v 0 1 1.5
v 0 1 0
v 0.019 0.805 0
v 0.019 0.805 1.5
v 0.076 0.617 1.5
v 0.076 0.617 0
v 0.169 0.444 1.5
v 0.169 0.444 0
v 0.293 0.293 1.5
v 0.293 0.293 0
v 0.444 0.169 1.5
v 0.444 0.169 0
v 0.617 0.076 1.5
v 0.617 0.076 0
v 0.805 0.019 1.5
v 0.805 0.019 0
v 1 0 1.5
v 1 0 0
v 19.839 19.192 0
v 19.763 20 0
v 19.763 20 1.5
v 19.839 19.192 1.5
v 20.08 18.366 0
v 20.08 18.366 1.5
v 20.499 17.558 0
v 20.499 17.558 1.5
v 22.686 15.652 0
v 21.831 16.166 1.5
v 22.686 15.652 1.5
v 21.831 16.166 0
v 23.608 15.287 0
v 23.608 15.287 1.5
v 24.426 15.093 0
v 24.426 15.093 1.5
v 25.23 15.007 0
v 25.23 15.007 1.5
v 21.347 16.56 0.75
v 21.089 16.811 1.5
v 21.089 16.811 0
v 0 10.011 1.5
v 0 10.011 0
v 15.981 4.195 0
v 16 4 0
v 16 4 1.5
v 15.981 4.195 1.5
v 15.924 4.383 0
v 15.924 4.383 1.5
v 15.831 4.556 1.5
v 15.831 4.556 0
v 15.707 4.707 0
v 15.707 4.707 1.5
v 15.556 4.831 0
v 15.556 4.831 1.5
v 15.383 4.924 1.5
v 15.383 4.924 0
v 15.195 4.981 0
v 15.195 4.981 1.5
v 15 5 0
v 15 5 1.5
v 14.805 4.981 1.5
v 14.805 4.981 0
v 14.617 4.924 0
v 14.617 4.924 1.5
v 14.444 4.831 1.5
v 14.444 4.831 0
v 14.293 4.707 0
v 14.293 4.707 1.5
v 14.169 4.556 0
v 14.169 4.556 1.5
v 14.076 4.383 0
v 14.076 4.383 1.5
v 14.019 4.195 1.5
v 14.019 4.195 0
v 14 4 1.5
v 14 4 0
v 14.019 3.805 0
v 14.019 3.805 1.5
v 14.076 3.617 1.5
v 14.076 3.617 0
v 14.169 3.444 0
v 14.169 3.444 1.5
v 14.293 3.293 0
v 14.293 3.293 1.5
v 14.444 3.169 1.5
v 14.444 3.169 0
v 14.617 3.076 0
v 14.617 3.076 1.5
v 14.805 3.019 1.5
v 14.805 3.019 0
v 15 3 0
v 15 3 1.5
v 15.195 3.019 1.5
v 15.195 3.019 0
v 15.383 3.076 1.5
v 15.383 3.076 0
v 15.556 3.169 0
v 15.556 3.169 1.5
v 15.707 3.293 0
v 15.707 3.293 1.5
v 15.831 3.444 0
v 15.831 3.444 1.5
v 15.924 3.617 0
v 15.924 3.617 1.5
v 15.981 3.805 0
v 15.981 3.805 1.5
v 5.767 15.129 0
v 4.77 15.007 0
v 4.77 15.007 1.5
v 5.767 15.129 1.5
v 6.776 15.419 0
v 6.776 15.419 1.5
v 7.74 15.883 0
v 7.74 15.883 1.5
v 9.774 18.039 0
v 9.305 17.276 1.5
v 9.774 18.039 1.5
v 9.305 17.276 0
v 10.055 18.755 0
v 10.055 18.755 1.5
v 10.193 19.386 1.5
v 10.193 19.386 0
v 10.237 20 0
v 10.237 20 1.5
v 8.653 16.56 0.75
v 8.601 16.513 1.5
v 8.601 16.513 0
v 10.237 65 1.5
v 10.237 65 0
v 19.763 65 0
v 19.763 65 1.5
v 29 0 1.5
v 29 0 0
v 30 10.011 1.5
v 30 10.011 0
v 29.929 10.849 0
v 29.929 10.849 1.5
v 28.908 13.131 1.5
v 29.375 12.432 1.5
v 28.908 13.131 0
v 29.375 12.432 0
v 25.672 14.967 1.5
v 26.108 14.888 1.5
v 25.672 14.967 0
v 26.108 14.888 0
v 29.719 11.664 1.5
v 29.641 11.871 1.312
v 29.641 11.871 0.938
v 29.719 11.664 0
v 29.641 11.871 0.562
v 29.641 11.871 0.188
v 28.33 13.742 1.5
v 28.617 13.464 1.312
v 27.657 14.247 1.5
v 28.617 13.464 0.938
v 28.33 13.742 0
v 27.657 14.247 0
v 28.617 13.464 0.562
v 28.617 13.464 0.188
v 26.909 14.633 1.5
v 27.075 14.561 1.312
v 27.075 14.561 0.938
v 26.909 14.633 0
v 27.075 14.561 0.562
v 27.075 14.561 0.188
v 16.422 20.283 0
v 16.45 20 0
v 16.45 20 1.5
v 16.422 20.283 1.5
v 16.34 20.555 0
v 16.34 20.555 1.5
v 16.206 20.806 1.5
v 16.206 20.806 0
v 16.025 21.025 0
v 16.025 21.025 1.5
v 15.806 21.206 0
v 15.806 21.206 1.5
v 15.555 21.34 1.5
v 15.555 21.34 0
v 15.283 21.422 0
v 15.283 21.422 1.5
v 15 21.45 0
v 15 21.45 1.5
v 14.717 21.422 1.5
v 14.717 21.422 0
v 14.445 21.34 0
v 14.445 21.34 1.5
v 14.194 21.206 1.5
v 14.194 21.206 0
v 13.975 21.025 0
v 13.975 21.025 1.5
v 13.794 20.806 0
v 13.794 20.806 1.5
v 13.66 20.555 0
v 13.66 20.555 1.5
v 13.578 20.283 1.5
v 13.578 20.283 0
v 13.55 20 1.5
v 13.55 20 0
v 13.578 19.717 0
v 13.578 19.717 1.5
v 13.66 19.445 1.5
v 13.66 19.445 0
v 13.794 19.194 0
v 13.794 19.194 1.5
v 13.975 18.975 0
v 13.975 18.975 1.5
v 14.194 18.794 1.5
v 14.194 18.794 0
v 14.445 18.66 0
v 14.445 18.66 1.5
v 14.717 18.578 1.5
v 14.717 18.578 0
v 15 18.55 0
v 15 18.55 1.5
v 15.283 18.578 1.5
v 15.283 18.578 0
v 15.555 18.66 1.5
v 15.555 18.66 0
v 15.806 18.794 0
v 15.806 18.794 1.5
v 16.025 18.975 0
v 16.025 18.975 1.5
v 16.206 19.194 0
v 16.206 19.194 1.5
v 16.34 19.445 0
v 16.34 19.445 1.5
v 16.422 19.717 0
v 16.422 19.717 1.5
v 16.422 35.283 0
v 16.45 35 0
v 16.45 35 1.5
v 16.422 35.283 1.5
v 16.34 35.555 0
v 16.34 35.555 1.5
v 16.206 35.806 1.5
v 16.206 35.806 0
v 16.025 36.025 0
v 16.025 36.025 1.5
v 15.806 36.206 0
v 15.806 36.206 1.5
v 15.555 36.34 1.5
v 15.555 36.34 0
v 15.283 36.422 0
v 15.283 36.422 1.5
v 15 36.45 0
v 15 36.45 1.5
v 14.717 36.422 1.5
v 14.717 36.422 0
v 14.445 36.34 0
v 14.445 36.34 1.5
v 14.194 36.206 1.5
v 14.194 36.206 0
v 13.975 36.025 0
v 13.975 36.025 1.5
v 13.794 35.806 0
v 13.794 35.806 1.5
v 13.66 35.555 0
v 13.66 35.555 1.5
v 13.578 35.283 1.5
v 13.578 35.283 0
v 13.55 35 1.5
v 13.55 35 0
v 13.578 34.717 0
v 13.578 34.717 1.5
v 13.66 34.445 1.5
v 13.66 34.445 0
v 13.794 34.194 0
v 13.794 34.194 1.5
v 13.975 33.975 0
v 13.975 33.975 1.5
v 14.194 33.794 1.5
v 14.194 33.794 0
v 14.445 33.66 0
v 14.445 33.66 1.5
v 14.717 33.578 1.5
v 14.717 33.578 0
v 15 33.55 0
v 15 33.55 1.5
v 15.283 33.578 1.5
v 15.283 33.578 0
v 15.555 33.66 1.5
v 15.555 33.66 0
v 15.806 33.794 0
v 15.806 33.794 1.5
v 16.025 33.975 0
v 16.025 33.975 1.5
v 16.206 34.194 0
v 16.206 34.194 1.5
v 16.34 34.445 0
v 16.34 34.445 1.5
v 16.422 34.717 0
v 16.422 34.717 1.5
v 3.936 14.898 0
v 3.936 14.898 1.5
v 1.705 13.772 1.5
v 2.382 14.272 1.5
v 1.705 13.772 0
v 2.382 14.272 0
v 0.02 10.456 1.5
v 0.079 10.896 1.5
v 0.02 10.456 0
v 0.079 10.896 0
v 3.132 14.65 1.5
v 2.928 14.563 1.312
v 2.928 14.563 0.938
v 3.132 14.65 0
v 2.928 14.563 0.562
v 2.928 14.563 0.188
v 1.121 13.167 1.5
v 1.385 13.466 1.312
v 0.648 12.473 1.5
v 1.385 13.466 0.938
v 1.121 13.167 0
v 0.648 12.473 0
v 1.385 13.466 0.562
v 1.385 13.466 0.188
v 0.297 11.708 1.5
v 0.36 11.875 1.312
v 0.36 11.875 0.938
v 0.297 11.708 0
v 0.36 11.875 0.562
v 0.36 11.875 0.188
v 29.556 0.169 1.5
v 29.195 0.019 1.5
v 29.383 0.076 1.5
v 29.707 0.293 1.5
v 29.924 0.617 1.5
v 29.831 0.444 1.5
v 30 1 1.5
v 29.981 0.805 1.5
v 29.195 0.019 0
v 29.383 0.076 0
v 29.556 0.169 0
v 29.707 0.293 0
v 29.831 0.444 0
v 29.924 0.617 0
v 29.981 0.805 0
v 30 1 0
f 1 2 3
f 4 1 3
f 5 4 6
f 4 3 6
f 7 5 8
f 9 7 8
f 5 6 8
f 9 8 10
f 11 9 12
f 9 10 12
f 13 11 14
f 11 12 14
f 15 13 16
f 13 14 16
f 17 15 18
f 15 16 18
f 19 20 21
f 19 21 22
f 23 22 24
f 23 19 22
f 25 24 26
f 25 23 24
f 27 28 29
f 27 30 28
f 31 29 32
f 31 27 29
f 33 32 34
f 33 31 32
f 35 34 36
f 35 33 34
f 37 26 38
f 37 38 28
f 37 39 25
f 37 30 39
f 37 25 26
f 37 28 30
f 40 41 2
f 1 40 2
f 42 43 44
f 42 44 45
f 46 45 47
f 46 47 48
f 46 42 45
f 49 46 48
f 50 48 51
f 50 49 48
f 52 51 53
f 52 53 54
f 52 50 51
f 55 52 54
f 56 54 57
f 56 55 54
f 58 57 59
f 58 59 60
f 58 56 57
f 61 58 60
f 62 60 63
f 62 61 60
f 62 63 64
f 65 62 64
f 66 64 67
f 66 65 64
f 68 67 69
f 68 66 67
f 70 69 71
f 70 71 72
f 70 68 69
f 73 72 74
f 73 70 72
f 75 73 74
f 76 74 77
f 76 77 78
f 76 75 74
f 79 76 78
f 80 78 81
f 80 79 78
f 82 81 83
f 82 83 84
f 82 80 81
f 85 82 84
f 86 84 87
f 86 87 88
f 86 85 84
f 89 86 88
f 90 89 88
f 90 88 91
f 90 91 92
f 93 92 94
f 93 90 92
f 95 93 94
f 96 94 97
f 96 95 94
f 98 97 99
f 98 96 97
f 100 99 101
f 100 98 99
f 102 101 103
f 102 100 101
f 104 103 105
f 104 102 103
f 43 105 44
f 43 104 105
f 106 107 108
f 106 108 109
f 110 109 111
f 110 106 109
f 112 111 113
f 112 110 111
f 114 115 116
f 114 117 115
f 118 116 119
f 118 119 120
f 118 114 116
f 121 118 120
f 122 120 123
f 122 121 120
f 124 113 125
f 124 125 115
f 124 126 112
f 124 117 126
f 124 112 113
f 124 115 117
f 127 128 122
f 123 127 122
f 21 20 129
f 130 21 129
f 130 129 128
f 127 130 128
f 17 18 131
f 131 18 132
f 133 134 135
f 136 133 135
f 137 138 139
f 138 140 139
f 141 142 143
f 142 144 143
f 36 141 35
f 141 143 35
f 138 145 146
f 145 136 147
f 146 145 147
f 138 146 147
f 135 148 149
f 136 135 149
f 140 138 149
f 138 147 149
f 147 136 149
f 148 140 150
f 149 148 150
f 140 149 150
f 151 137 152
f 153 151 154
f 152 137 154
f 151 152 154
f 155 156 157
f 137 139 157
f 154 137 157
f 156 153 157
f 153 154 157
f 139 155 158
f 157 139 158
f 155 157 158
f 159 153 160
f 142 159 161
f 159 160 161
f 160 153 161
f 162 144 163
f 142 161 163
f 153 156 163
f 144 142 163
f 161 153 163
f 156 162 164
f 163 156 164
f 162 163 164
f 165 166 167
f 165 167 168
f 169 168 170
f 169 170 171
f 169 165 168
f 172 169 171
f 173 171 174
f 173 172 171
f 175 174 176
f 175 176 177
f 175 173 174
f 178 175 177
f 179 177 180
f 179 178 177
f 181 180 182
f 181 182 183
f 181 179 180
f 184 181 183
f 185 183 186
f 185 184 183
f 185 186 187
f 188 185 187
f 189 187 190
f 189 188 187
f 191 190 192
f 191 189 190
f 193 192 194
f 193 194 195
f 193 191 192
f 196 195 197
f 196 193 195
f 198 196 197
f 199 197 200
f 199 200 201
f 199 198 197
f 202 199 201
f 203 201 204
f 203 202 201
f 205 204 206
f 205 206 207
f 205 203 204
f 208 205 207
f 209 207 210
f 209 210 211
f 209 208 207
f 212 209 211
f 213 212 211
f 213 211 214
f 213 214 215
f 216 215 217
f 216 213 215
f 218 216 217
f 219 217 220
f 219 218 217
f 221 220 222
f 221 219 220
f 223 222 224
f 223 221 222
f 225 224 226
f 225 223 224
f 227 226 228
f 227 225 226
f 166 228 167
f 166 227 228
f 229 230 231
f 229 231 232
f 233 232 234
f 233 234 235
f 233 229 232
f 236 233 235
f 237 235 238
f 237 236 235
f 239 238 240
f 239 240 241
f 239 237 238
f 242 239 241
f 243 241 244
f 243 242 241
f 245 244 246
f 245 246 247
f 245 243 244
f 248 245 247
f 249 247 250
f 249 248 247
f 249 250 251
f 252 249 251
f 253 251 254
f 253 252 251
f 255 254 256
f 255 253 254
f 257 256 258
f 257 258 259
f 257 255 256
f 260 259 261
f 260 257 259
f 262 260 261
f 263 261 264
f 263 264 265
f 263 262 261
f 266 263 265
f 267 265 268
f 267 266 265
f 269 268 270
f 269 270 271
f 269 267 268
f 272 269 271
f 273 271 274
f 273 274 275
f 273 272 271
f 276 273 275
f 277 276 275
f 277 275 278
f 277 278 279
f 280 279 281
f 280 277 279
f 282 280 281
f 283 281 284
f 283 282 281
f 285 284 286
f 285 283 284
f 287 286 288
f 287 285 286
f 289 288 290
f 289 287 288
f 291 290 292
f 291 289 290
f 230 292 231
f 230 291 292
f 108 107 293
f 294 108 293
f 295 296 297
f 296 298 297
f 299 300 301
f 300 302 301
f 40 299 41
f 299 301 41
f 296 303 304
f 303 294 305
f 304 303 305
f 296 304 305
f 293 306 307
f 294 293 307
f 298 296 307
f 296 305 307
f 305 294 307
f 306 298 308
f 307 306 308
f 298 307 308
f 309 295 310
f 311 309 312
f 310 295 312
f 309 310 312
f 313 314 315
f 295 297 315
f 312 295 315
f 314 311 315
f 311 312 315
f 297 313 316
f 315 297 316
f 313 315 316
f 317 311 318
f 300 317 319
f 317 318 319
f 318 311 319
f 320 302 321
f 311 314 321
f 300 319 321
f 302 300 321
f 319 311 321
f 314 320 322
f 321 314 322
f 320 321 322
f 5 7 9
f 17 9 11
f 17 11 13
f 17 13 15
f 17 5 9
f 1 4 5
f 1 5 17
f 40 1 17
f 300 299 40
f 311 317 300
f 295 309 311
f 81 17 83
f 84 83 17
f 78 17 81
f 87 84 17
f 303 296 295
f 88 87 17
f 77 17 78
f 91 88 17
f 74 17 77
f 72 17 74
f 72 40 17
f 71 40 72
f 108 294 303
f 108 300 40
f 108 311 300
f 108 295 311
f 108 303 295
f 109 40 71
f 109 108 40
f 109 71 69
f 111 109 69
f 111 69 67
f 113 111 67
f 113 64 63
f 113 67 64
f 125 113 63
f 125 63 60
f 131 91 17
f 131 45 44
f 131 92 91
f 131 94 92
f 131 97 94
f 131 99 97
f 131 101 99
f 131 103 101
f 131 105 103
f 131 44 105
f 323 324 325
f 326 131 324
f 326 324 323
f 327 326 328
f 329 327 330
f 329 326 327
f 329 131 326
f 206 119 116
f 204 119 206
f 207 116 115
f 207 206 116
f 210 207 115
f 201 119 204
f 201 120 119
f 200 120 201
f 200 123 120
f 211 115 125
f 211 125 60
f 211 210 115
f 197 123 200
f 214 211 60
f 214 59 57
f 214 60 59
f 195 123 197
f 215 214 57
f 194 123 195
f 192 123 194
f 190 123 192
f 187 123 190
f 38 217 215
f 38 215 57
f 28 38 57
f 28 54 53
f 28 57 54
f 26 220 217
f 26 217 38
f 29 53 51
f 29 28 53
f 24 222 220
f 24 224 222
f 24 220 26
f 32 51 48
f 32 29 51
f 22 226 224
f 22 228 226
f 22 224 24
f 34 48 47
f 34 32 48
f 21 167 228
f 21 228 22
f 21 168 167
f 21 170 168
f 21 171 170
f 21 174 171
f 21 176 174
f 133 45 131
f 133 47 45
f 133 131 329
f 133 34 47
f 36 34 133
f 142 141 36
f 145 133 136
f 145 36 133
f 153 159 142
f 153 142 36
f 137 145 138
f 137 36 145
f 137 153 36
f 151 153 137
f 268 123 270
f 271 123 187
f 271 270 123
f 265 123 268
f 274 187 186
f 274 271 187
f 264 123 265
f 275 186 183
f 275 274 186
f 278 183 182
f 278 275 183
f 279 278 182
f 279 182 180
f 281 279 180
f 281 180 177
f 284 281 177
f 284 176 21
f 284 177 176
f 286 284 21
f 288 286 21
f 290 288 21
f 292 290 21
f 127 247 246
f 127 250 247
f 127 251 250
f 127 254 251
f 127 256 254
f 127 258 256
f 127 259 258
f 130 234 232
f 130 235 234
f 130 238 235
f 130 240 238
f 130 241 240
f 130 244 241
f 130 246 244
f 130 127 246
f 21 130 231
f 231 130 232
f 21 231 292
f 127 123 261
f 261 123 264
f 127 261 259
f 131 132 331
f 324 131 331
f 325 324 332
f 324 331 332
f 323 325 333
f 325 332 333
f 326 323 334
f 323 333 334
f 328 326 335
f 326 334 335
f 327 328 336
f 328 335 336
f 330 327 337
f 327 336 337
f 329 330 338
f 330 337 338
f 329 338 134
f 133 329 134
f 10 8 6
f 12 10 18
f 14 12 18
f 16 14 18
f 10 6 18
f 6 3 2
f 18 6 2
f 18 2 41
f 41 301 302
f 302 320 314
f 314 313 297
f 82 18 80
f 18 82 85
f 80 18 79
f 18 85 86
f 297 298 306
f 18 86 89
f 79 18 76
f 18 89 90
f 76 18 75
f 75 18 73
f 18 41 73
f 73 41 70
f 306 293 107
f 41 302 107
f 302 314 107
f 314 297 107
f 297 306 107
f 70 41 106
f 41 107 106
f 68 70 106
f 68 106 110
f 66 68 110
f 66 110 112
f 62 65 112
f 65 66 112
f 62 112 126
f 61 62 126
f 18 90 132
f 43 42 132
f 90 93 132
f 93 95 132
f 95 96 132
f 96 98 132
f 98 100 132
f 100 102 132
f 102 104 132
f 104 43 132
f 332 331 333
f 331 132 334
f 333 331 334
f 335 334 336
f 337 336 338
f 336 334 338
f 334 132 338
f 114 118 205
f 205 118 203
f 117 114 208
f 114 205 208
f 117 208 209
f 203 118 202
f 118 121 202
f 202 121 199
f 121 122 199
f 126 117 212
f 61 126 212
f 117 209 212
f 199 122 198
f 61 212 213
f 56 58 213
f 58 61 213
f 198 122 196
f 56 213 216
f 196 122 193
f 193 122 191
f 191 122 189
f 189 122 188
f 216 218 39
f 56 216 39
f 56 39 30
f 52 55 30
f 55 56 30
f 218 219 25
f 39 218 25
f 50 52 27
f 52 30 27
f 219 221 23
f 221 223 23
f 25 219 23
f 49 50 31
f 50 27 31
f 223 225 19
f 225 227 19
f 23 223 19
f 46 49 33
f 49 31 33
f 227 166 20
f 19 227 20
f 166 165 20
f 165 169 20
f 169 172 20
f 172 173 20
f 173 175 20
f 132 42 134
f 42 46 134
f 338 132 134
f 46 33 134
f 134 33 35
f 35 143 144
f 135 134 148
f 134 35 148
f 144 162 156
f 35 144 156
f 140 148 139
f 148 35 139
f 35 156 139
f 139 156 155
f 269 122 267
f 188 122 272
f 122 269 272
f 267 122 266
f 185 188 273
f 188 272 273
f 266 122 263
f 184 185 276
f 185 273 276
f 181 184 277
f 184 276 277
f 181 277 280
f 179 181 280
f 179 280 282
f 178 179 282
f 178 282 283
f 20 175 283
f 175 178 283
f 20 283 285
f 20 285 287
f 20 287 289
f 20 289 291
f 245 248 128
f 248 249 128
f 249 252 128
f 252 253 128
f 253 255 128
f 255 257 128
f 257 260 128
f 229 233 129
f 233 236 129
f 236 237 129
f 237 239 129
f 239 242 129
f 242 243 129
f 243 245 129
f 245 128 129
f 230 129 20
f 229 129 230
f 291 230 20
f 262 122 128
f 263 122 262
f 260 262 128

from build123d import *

# Parameters (mm, degrees)
SKETCH1_R           = 1
SKETCH1_R_2         = 1.45
BOSS_EXTRUDE1_DEPTH = 1.5


with BuildPart() as part:
    # Sketch1 → Boss-Extrude1 (new body)
    with BuildSketch(Plane.XY):
        with BuildLine():
            Line((1, 0), (29, 0))
            ThreePointArc((29, 0), (29.707106781, 0.292893219), (30, 1))
            Line((30, 1), (30, 10.010805278))
            add(Edge.make_bspline(
                [(30, 10.010805278), (30, 10.331309343), (29.969485344, 10.646616833), (29.849948512, 11.267268119), (29.75966755, 11.575507617), (29.52283644, 12.166717494), (29.377858407, 12.44760172), (29.03567781, 12.980427757), (28.836063124, 13.234342382), (28.398424751, 13.693093363), (28.159679219, 13.900081722), (27.642024265, 14.268934545), (27.362921955, 14.429904426), (26.787626221, 14.692448411), (26.488674786, 14.796208342), (25.867413661, 14.94687591), (25.550156827, 14.992309833), (25.229989605, 15.007057677)],
                knots=[0, 0, 0, 0, 0.125, 0.125, 0.25, 0.25, 0.375, 0.375, 0.5, 0.5, 0.625, 0.625, 0.75, 0.75, 0.875, 0.875, 1, 1, 1, 1], degree=3))
            add(Edge.make_bspline(
                [(19.763139721, 20), (19.763139721, 15.258876858), (25.229989605, 15.007057677)],
                knots=[0, 0, 0, 1.517657498, 1.517657498, 1.517657498], degree=2, weights=[1, 0.725642413, 1]))
            Line((19.763139721, 20), (19.763139721, 65))
            Line((19.763139721, 65), (10.236860279, 65))
            Line((10.236860279, 65), (10.236860279, 20))
            add(Edge.make_bspline(
                [(4.770010395, 15.007057677), (10.236860279, 15.258876858), (10.236860279, 20)],
                knots=[4.765527809, 4.765527809, 4.765527809, 6.283185307, 6.283185307, 6.283185307], degree=2, weights=[1, 0.725642413, 1]))
            add(Edge.make_bspline(
                [(4.770010395, 15.007057677), (4.449845357, 14.992309934), (4.136282013, 14.947292066), (3.521812442, 14.799220851), (3.218062701, 14.694770205), (2.638478447, 14.430814604), (2.364622125, 14.272965812), (1.848237929, 13.906408033), (1.60386949, 13.695209671), (1.16596165, 13.236750613), (0.970282062, 12.988644641), (0.625834171, 12.454385704), (0.478004619, 12.168149386), (0.242397802, 11.581322908), (0.15257366, 11.277880984), (0.03075096, 10.650270556), (0, 10.331307007), (0, 10.010805278)],
                knots=[0, 0, 0, 0, 0.125, 0.125, 0.25, 0.25, 0.375, 0.375, 0.5, 0.5, 0.625, 0.625, 0.75, 0.75, 0.875, 0.875, 1, 1, 1, 1], degree=3))
            Line((0, 10.010805278), (0, 1))
            ThreePointArc((0, 1), (0.292893219, 0.292893219), (1, 0))
        make_face()
        with Locations((15, 4)):
            Circle(SKETCH1_R, mode=Mode.SUBTRACT)
        with Locations((15, 20)):
            Circle(SKETCH1_R_2, mode=Mode.SUBTRACT)
        with Locations((15, 35)):
            Circle(SKETCH1_R_2, mode=Mode.SUBTRACT)
    extrude(amount=BOSS_EXTRUDE1_DEPTH)


solid = part.part
